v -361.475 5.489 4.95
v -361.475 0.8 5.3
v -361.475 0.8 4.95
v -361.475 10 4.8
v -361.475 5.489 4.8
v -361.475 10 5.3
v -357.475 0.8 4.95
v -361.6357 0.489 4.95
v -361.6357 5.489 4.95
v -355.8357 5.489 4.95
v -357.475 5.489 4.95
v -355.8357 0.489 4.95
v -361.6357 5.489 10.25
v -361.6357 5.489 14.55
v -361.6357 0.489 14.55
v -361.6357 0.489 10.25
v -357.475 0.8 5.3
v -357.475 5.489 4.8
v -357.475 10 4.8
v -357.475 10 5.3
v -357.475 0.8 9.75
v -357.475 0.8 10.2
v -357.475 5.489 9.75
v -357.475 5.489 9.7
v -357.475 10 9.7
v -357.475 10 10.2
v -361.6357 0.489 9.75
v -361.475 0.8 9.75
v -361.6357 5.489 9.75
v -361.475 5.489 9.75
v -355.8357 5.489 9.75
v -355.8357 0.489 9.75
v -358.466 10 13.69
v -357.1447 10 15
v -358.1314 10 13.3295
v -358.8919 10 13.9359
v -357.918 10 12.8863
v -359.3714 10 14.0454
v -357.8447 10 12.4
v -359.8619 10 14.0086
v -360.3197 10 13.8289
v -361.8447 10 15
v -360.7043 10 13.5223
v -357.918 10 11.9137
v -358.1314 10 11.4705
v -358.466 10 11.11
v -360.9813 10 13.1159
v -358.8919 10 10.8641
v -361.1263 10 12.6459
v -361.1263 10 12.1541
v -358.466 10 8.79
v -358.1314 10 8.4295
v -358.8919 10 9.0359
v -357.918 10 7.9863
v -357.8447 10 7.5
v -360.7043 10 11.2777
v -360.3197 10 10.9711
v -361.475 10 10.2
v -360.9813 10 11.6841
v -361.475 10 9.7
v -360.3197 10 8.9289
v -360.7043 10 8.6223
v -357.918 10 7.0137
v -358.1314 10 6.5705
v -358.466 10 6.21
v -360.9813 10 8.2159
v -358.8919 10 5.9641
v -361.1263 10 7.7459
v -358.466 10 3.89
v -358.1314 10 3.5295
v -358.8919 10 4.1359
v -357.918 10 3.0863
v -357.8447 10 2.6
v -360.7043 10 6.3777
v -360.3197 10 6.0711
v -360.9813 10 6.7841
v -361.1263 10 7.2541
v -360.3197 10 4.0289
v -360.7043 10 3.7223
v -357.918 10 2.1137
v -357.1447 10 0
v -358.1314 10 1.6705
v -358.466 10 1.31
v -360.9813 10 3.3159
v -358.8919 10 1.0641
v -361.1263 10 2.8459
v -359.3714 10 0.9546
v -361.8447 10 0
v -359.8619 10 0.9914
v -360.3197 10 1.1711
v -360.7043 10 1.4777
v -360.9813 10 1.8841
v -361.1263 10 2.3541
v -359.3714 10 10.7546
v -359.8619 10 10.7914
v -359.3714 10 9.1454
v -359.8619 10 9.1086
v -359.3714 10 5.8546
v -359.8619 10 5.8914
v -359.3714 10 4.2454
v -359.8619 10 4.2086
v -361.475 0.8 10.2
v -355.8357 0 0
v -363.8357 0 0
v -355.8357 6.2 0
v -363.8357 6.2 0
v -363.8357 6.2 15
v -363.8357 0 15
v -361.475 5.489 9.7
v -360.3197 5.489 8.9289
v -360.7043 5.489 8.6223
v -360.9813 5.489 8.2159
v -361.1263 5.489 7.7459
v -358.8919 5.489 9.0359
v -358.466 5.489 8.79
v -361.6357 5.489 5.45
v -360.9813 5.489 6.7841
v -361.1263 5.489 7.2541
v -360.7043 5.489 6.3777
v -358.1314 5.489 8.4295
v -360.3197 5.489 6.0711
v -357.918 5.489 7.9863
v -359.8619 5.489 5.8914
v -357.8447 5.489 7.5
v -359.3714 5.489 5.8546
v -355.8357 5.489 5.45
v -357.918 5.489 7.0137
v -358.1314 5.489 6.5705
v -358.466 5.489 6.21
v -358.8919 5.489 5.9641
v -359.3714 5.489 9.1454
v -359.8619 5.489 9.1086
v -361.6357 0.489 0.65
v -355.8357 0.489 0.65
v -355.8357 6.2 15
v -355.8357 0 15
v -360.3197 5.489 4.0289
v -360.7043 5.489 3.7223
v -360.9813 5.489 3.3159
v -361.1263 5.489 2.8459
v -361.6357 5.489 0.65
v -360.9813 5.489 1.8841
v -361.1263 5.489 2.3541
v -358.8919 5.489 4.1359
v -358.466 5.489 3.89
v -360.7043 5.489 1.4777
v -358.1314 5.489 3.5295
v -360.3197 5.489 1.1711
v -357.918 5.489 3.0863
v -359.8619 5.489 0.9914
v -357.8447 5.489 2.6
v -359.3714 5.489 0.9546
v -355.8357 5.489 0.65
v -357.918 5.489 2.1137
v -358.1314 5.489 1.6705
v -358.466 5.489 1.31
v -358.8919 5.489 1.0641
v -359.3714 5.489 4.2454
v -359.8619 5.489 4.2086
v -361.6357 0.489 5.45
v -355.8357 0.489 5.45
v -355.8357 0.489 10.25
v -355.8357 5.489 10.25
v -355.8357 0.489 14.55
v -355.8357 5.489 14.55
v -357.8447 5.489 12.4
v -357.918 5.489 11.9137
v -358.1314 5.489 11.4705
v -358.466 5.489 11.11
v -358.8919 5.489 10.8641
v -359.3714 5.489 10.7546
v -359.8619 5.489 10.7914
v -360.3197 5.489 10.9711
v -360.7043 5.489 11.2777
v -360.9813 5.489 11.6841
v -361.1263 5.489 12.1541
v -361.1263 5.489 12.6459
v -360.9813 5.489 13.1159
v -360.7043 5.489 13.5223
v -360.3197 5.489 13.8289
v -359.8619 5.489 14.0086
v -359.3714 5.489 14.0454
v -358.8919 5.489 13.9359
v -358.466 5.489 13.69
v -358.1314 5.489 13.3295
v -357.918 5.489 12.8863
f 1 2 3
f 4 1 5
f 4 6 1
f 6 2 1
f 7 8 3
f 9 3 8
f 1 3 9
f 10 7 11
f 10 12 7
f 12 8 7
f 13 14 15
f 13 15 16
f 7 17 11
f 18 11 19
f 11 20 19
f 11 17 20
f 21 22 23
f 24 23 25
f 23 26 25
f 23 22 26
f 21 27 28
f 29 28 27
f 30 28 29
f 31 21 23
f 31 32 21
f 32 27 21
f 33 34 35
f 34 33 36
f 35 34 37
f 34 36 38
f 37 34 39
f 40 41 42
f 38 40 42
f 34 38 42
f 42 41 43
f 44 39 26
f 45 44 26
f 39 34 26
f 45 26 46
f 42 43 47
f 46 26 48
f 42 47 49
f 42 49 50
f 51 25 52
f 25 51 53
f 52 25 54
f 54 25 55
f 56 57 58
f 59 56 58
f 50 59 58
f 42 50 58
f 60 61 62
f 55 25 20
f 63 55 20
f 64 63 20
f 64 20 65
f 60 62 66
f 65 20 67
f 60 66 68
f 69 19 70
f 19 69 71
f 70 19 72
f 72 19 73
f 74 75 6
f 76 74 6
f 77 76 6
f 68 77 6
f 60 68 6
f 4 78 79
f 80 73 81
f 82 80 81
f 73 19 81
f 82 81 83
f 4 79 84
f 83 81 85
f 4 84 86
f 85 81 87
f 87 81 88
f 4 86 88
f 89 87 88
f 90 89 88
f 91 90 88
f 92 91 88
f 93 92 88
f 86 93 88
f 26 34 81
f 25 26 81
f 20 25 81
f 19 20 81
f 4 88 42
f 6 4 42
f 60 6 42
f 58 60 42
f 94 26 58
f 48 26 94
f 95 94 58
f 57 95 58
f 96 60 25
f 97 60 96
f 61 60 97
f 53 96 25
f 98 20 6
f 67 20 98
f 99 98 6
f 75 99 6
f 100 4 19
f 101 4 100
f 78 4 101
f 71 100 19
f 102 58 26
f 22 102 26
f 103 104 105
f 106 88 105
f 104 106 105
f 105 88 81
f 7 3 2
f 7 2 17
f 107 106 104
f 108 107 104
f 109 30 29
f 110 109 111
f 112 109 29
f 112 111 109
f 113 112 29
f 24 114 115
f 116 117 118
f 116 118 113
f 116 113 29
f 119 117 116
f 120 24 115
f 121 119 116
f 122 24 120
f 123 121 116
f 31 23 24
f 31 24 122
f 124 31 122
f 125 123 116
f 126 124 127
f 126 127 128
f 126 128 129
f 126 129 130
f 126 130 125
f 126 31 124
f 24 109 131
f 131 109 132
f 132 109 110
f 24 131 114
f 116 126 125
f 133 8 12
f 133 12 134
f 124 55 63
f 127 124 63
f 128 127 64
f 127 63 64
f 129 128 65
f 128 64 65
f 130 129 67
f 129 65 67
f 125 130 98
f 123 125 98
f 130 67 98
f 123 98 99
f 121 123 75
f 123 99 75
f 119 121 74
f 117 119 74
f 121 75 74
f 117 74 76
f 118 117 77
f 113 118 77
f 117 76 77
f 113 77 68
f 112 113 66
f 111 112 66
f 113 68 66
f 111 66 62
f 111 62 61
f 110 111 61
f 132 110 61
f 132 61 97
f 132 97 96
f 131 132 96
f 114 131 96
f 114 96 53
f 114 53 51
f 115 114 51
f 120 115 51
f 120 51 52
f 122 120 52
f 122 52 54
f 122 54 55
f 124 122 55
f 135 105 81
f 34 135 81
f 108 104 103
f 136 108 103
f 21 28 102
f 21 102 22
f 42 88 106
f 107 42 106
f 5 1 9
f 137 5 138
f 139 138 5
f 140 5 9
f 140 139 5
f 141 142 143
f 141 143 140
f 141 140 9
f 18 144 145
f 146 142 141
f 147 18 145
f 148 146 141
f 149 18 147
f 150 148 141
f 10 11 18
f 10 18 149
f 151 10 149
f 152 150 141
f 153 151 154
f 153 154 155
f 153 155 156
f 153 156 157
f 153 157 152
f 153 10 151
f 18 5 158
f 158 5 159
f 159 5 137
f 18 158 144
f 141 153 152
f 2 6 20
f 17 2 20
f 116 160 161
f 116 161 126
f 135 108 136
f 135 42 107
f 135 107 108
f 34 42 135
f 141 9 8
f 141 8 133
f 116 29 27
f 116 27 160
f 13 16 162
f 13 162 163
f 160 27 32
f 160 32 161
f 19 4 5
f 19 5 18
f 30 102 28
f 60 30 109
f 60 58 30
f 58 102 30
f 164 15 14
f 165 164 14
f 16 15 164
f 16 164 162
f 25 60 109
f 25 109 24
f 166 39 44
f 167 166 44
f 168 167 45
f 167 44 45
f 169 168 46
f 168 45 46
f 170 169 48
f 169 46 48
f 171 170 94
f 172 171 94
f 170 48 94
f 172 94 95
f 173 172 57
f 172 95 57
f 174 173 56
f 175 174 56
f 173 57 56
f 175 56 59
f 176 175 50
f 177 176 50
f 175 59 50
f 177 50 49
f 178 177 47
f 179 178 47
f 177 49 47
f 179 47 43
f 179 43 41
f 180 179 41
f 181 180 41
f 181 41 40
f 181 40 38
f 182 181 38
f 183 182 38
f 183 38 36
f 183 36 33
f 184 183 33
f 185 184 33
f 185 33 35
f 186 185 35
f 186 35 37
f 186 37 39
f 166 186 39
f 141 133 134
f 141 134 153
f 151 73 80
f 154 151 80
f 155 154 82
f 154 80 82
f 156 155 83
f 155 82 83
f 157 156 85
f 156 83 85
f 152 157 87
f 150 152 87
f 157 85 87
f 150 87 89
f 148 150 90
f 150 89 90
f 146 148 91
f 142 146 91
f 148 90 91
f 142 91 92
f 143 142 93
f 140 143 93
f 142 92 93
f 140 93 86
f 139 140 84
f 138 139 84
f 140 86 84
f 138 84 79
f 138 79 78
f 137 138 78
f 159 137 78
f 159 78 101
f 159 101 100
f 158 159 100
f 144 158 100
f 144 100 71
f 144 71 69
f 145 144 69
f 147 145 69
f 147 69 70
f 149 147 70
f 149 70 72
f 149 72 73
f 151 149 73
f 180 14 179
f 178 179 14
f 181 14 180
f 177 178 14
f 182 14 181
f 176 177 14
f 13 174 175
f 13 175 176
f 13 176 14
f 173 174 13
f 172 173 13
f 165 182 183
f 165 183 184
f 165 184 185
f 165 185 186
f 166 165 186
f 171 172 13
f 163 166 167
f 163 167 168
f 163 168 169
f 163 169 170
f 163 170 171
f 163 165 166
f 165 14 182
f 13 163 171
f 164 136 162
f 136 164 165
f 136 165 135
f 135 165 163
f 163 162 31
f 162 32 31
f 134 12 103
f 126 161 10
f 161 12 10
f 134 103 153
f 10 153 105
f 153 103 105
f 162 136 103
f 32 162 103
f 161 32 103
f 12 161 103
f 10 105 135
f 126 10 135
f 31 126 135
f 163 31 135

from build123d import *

# Parameters (mm, degrees)
BOSS_EXTRUDE1_DEPTH = 15
SKETCH2_W           = 4
SKETCH2_H           = 0.5
SKETCH2_R           = 1.65
CUT_EXTRUDE1_DEPTH  = 9.2
SKETCH3_W           = 4.3
SKETCH3_H           = 5
CUT_EXTRUDE2_DEPTH  = 5.8


with BuildPart() as part:
    # Sketch1 → Boss-Extrude1 (new body)
    with BuildSketch(Plane.XY):
        Polygon((-363.835743374, 0), (-355.835743374, 0), (-355.835743374, 6.2), (-357.144738603, 10), (-361.844738603, 10), (-363.835743374, 6.2), align=None)
    extrude(amount=BOSS_EXTRUDE1_DEPTH)

    # Sketch2 → Cut-Extrude1 (cut)
    with BuildSketch(Plane(origin=(0, 10, 0), x_dir=(1, 0, 0), z_dir=(0, 1, 0))):
        with Locations((-359.47498497, -5.05)):
            Rectangle(SKETCH2_W, SKETCH2_H)
        with Locations((-359.47498497, -9.95)):
            Rectangle(SKETCH2_W, SKETCH2_H)
        with Locations((-359.494738603, -2.6)):
            Circle(SKETCH2_R)
        with Locations((-359.494738603, -7.5)):
            Circle(SKETCH2_R)
        with Locations((-359.494738603, -12.4)):
            Circle(SKETCH2_R)
    extrude(amount=-CUT_EXTRUDE1_DEPTH, mode=Mode.SUBTRACT)

    # Sketch3 → Cut-Extrude2 (cut)
    with BuildSketch(Plane(origin=(-355.835743374, 0, 0), x_dir=(0, 0, -1), z_dir=(1, 0, 0))):
        with Locations((-12.4, 2.989005182)):
            Rectangle(SKETCH3_W, SKETCH3_H)
        with Locations((-7.6, 2.989005182)):
            Rectangle(SKETCH3_W, SKETCH3_H)
        with Locations((-2.8, 2.989005182)):
            Rectangle(SKETCH3_W, SKETCH3_H)
    extrude(amount=-CUT_EXTRUDE2_DEPTH, mode=Mode.SUBTRACT)


solid = part.part
